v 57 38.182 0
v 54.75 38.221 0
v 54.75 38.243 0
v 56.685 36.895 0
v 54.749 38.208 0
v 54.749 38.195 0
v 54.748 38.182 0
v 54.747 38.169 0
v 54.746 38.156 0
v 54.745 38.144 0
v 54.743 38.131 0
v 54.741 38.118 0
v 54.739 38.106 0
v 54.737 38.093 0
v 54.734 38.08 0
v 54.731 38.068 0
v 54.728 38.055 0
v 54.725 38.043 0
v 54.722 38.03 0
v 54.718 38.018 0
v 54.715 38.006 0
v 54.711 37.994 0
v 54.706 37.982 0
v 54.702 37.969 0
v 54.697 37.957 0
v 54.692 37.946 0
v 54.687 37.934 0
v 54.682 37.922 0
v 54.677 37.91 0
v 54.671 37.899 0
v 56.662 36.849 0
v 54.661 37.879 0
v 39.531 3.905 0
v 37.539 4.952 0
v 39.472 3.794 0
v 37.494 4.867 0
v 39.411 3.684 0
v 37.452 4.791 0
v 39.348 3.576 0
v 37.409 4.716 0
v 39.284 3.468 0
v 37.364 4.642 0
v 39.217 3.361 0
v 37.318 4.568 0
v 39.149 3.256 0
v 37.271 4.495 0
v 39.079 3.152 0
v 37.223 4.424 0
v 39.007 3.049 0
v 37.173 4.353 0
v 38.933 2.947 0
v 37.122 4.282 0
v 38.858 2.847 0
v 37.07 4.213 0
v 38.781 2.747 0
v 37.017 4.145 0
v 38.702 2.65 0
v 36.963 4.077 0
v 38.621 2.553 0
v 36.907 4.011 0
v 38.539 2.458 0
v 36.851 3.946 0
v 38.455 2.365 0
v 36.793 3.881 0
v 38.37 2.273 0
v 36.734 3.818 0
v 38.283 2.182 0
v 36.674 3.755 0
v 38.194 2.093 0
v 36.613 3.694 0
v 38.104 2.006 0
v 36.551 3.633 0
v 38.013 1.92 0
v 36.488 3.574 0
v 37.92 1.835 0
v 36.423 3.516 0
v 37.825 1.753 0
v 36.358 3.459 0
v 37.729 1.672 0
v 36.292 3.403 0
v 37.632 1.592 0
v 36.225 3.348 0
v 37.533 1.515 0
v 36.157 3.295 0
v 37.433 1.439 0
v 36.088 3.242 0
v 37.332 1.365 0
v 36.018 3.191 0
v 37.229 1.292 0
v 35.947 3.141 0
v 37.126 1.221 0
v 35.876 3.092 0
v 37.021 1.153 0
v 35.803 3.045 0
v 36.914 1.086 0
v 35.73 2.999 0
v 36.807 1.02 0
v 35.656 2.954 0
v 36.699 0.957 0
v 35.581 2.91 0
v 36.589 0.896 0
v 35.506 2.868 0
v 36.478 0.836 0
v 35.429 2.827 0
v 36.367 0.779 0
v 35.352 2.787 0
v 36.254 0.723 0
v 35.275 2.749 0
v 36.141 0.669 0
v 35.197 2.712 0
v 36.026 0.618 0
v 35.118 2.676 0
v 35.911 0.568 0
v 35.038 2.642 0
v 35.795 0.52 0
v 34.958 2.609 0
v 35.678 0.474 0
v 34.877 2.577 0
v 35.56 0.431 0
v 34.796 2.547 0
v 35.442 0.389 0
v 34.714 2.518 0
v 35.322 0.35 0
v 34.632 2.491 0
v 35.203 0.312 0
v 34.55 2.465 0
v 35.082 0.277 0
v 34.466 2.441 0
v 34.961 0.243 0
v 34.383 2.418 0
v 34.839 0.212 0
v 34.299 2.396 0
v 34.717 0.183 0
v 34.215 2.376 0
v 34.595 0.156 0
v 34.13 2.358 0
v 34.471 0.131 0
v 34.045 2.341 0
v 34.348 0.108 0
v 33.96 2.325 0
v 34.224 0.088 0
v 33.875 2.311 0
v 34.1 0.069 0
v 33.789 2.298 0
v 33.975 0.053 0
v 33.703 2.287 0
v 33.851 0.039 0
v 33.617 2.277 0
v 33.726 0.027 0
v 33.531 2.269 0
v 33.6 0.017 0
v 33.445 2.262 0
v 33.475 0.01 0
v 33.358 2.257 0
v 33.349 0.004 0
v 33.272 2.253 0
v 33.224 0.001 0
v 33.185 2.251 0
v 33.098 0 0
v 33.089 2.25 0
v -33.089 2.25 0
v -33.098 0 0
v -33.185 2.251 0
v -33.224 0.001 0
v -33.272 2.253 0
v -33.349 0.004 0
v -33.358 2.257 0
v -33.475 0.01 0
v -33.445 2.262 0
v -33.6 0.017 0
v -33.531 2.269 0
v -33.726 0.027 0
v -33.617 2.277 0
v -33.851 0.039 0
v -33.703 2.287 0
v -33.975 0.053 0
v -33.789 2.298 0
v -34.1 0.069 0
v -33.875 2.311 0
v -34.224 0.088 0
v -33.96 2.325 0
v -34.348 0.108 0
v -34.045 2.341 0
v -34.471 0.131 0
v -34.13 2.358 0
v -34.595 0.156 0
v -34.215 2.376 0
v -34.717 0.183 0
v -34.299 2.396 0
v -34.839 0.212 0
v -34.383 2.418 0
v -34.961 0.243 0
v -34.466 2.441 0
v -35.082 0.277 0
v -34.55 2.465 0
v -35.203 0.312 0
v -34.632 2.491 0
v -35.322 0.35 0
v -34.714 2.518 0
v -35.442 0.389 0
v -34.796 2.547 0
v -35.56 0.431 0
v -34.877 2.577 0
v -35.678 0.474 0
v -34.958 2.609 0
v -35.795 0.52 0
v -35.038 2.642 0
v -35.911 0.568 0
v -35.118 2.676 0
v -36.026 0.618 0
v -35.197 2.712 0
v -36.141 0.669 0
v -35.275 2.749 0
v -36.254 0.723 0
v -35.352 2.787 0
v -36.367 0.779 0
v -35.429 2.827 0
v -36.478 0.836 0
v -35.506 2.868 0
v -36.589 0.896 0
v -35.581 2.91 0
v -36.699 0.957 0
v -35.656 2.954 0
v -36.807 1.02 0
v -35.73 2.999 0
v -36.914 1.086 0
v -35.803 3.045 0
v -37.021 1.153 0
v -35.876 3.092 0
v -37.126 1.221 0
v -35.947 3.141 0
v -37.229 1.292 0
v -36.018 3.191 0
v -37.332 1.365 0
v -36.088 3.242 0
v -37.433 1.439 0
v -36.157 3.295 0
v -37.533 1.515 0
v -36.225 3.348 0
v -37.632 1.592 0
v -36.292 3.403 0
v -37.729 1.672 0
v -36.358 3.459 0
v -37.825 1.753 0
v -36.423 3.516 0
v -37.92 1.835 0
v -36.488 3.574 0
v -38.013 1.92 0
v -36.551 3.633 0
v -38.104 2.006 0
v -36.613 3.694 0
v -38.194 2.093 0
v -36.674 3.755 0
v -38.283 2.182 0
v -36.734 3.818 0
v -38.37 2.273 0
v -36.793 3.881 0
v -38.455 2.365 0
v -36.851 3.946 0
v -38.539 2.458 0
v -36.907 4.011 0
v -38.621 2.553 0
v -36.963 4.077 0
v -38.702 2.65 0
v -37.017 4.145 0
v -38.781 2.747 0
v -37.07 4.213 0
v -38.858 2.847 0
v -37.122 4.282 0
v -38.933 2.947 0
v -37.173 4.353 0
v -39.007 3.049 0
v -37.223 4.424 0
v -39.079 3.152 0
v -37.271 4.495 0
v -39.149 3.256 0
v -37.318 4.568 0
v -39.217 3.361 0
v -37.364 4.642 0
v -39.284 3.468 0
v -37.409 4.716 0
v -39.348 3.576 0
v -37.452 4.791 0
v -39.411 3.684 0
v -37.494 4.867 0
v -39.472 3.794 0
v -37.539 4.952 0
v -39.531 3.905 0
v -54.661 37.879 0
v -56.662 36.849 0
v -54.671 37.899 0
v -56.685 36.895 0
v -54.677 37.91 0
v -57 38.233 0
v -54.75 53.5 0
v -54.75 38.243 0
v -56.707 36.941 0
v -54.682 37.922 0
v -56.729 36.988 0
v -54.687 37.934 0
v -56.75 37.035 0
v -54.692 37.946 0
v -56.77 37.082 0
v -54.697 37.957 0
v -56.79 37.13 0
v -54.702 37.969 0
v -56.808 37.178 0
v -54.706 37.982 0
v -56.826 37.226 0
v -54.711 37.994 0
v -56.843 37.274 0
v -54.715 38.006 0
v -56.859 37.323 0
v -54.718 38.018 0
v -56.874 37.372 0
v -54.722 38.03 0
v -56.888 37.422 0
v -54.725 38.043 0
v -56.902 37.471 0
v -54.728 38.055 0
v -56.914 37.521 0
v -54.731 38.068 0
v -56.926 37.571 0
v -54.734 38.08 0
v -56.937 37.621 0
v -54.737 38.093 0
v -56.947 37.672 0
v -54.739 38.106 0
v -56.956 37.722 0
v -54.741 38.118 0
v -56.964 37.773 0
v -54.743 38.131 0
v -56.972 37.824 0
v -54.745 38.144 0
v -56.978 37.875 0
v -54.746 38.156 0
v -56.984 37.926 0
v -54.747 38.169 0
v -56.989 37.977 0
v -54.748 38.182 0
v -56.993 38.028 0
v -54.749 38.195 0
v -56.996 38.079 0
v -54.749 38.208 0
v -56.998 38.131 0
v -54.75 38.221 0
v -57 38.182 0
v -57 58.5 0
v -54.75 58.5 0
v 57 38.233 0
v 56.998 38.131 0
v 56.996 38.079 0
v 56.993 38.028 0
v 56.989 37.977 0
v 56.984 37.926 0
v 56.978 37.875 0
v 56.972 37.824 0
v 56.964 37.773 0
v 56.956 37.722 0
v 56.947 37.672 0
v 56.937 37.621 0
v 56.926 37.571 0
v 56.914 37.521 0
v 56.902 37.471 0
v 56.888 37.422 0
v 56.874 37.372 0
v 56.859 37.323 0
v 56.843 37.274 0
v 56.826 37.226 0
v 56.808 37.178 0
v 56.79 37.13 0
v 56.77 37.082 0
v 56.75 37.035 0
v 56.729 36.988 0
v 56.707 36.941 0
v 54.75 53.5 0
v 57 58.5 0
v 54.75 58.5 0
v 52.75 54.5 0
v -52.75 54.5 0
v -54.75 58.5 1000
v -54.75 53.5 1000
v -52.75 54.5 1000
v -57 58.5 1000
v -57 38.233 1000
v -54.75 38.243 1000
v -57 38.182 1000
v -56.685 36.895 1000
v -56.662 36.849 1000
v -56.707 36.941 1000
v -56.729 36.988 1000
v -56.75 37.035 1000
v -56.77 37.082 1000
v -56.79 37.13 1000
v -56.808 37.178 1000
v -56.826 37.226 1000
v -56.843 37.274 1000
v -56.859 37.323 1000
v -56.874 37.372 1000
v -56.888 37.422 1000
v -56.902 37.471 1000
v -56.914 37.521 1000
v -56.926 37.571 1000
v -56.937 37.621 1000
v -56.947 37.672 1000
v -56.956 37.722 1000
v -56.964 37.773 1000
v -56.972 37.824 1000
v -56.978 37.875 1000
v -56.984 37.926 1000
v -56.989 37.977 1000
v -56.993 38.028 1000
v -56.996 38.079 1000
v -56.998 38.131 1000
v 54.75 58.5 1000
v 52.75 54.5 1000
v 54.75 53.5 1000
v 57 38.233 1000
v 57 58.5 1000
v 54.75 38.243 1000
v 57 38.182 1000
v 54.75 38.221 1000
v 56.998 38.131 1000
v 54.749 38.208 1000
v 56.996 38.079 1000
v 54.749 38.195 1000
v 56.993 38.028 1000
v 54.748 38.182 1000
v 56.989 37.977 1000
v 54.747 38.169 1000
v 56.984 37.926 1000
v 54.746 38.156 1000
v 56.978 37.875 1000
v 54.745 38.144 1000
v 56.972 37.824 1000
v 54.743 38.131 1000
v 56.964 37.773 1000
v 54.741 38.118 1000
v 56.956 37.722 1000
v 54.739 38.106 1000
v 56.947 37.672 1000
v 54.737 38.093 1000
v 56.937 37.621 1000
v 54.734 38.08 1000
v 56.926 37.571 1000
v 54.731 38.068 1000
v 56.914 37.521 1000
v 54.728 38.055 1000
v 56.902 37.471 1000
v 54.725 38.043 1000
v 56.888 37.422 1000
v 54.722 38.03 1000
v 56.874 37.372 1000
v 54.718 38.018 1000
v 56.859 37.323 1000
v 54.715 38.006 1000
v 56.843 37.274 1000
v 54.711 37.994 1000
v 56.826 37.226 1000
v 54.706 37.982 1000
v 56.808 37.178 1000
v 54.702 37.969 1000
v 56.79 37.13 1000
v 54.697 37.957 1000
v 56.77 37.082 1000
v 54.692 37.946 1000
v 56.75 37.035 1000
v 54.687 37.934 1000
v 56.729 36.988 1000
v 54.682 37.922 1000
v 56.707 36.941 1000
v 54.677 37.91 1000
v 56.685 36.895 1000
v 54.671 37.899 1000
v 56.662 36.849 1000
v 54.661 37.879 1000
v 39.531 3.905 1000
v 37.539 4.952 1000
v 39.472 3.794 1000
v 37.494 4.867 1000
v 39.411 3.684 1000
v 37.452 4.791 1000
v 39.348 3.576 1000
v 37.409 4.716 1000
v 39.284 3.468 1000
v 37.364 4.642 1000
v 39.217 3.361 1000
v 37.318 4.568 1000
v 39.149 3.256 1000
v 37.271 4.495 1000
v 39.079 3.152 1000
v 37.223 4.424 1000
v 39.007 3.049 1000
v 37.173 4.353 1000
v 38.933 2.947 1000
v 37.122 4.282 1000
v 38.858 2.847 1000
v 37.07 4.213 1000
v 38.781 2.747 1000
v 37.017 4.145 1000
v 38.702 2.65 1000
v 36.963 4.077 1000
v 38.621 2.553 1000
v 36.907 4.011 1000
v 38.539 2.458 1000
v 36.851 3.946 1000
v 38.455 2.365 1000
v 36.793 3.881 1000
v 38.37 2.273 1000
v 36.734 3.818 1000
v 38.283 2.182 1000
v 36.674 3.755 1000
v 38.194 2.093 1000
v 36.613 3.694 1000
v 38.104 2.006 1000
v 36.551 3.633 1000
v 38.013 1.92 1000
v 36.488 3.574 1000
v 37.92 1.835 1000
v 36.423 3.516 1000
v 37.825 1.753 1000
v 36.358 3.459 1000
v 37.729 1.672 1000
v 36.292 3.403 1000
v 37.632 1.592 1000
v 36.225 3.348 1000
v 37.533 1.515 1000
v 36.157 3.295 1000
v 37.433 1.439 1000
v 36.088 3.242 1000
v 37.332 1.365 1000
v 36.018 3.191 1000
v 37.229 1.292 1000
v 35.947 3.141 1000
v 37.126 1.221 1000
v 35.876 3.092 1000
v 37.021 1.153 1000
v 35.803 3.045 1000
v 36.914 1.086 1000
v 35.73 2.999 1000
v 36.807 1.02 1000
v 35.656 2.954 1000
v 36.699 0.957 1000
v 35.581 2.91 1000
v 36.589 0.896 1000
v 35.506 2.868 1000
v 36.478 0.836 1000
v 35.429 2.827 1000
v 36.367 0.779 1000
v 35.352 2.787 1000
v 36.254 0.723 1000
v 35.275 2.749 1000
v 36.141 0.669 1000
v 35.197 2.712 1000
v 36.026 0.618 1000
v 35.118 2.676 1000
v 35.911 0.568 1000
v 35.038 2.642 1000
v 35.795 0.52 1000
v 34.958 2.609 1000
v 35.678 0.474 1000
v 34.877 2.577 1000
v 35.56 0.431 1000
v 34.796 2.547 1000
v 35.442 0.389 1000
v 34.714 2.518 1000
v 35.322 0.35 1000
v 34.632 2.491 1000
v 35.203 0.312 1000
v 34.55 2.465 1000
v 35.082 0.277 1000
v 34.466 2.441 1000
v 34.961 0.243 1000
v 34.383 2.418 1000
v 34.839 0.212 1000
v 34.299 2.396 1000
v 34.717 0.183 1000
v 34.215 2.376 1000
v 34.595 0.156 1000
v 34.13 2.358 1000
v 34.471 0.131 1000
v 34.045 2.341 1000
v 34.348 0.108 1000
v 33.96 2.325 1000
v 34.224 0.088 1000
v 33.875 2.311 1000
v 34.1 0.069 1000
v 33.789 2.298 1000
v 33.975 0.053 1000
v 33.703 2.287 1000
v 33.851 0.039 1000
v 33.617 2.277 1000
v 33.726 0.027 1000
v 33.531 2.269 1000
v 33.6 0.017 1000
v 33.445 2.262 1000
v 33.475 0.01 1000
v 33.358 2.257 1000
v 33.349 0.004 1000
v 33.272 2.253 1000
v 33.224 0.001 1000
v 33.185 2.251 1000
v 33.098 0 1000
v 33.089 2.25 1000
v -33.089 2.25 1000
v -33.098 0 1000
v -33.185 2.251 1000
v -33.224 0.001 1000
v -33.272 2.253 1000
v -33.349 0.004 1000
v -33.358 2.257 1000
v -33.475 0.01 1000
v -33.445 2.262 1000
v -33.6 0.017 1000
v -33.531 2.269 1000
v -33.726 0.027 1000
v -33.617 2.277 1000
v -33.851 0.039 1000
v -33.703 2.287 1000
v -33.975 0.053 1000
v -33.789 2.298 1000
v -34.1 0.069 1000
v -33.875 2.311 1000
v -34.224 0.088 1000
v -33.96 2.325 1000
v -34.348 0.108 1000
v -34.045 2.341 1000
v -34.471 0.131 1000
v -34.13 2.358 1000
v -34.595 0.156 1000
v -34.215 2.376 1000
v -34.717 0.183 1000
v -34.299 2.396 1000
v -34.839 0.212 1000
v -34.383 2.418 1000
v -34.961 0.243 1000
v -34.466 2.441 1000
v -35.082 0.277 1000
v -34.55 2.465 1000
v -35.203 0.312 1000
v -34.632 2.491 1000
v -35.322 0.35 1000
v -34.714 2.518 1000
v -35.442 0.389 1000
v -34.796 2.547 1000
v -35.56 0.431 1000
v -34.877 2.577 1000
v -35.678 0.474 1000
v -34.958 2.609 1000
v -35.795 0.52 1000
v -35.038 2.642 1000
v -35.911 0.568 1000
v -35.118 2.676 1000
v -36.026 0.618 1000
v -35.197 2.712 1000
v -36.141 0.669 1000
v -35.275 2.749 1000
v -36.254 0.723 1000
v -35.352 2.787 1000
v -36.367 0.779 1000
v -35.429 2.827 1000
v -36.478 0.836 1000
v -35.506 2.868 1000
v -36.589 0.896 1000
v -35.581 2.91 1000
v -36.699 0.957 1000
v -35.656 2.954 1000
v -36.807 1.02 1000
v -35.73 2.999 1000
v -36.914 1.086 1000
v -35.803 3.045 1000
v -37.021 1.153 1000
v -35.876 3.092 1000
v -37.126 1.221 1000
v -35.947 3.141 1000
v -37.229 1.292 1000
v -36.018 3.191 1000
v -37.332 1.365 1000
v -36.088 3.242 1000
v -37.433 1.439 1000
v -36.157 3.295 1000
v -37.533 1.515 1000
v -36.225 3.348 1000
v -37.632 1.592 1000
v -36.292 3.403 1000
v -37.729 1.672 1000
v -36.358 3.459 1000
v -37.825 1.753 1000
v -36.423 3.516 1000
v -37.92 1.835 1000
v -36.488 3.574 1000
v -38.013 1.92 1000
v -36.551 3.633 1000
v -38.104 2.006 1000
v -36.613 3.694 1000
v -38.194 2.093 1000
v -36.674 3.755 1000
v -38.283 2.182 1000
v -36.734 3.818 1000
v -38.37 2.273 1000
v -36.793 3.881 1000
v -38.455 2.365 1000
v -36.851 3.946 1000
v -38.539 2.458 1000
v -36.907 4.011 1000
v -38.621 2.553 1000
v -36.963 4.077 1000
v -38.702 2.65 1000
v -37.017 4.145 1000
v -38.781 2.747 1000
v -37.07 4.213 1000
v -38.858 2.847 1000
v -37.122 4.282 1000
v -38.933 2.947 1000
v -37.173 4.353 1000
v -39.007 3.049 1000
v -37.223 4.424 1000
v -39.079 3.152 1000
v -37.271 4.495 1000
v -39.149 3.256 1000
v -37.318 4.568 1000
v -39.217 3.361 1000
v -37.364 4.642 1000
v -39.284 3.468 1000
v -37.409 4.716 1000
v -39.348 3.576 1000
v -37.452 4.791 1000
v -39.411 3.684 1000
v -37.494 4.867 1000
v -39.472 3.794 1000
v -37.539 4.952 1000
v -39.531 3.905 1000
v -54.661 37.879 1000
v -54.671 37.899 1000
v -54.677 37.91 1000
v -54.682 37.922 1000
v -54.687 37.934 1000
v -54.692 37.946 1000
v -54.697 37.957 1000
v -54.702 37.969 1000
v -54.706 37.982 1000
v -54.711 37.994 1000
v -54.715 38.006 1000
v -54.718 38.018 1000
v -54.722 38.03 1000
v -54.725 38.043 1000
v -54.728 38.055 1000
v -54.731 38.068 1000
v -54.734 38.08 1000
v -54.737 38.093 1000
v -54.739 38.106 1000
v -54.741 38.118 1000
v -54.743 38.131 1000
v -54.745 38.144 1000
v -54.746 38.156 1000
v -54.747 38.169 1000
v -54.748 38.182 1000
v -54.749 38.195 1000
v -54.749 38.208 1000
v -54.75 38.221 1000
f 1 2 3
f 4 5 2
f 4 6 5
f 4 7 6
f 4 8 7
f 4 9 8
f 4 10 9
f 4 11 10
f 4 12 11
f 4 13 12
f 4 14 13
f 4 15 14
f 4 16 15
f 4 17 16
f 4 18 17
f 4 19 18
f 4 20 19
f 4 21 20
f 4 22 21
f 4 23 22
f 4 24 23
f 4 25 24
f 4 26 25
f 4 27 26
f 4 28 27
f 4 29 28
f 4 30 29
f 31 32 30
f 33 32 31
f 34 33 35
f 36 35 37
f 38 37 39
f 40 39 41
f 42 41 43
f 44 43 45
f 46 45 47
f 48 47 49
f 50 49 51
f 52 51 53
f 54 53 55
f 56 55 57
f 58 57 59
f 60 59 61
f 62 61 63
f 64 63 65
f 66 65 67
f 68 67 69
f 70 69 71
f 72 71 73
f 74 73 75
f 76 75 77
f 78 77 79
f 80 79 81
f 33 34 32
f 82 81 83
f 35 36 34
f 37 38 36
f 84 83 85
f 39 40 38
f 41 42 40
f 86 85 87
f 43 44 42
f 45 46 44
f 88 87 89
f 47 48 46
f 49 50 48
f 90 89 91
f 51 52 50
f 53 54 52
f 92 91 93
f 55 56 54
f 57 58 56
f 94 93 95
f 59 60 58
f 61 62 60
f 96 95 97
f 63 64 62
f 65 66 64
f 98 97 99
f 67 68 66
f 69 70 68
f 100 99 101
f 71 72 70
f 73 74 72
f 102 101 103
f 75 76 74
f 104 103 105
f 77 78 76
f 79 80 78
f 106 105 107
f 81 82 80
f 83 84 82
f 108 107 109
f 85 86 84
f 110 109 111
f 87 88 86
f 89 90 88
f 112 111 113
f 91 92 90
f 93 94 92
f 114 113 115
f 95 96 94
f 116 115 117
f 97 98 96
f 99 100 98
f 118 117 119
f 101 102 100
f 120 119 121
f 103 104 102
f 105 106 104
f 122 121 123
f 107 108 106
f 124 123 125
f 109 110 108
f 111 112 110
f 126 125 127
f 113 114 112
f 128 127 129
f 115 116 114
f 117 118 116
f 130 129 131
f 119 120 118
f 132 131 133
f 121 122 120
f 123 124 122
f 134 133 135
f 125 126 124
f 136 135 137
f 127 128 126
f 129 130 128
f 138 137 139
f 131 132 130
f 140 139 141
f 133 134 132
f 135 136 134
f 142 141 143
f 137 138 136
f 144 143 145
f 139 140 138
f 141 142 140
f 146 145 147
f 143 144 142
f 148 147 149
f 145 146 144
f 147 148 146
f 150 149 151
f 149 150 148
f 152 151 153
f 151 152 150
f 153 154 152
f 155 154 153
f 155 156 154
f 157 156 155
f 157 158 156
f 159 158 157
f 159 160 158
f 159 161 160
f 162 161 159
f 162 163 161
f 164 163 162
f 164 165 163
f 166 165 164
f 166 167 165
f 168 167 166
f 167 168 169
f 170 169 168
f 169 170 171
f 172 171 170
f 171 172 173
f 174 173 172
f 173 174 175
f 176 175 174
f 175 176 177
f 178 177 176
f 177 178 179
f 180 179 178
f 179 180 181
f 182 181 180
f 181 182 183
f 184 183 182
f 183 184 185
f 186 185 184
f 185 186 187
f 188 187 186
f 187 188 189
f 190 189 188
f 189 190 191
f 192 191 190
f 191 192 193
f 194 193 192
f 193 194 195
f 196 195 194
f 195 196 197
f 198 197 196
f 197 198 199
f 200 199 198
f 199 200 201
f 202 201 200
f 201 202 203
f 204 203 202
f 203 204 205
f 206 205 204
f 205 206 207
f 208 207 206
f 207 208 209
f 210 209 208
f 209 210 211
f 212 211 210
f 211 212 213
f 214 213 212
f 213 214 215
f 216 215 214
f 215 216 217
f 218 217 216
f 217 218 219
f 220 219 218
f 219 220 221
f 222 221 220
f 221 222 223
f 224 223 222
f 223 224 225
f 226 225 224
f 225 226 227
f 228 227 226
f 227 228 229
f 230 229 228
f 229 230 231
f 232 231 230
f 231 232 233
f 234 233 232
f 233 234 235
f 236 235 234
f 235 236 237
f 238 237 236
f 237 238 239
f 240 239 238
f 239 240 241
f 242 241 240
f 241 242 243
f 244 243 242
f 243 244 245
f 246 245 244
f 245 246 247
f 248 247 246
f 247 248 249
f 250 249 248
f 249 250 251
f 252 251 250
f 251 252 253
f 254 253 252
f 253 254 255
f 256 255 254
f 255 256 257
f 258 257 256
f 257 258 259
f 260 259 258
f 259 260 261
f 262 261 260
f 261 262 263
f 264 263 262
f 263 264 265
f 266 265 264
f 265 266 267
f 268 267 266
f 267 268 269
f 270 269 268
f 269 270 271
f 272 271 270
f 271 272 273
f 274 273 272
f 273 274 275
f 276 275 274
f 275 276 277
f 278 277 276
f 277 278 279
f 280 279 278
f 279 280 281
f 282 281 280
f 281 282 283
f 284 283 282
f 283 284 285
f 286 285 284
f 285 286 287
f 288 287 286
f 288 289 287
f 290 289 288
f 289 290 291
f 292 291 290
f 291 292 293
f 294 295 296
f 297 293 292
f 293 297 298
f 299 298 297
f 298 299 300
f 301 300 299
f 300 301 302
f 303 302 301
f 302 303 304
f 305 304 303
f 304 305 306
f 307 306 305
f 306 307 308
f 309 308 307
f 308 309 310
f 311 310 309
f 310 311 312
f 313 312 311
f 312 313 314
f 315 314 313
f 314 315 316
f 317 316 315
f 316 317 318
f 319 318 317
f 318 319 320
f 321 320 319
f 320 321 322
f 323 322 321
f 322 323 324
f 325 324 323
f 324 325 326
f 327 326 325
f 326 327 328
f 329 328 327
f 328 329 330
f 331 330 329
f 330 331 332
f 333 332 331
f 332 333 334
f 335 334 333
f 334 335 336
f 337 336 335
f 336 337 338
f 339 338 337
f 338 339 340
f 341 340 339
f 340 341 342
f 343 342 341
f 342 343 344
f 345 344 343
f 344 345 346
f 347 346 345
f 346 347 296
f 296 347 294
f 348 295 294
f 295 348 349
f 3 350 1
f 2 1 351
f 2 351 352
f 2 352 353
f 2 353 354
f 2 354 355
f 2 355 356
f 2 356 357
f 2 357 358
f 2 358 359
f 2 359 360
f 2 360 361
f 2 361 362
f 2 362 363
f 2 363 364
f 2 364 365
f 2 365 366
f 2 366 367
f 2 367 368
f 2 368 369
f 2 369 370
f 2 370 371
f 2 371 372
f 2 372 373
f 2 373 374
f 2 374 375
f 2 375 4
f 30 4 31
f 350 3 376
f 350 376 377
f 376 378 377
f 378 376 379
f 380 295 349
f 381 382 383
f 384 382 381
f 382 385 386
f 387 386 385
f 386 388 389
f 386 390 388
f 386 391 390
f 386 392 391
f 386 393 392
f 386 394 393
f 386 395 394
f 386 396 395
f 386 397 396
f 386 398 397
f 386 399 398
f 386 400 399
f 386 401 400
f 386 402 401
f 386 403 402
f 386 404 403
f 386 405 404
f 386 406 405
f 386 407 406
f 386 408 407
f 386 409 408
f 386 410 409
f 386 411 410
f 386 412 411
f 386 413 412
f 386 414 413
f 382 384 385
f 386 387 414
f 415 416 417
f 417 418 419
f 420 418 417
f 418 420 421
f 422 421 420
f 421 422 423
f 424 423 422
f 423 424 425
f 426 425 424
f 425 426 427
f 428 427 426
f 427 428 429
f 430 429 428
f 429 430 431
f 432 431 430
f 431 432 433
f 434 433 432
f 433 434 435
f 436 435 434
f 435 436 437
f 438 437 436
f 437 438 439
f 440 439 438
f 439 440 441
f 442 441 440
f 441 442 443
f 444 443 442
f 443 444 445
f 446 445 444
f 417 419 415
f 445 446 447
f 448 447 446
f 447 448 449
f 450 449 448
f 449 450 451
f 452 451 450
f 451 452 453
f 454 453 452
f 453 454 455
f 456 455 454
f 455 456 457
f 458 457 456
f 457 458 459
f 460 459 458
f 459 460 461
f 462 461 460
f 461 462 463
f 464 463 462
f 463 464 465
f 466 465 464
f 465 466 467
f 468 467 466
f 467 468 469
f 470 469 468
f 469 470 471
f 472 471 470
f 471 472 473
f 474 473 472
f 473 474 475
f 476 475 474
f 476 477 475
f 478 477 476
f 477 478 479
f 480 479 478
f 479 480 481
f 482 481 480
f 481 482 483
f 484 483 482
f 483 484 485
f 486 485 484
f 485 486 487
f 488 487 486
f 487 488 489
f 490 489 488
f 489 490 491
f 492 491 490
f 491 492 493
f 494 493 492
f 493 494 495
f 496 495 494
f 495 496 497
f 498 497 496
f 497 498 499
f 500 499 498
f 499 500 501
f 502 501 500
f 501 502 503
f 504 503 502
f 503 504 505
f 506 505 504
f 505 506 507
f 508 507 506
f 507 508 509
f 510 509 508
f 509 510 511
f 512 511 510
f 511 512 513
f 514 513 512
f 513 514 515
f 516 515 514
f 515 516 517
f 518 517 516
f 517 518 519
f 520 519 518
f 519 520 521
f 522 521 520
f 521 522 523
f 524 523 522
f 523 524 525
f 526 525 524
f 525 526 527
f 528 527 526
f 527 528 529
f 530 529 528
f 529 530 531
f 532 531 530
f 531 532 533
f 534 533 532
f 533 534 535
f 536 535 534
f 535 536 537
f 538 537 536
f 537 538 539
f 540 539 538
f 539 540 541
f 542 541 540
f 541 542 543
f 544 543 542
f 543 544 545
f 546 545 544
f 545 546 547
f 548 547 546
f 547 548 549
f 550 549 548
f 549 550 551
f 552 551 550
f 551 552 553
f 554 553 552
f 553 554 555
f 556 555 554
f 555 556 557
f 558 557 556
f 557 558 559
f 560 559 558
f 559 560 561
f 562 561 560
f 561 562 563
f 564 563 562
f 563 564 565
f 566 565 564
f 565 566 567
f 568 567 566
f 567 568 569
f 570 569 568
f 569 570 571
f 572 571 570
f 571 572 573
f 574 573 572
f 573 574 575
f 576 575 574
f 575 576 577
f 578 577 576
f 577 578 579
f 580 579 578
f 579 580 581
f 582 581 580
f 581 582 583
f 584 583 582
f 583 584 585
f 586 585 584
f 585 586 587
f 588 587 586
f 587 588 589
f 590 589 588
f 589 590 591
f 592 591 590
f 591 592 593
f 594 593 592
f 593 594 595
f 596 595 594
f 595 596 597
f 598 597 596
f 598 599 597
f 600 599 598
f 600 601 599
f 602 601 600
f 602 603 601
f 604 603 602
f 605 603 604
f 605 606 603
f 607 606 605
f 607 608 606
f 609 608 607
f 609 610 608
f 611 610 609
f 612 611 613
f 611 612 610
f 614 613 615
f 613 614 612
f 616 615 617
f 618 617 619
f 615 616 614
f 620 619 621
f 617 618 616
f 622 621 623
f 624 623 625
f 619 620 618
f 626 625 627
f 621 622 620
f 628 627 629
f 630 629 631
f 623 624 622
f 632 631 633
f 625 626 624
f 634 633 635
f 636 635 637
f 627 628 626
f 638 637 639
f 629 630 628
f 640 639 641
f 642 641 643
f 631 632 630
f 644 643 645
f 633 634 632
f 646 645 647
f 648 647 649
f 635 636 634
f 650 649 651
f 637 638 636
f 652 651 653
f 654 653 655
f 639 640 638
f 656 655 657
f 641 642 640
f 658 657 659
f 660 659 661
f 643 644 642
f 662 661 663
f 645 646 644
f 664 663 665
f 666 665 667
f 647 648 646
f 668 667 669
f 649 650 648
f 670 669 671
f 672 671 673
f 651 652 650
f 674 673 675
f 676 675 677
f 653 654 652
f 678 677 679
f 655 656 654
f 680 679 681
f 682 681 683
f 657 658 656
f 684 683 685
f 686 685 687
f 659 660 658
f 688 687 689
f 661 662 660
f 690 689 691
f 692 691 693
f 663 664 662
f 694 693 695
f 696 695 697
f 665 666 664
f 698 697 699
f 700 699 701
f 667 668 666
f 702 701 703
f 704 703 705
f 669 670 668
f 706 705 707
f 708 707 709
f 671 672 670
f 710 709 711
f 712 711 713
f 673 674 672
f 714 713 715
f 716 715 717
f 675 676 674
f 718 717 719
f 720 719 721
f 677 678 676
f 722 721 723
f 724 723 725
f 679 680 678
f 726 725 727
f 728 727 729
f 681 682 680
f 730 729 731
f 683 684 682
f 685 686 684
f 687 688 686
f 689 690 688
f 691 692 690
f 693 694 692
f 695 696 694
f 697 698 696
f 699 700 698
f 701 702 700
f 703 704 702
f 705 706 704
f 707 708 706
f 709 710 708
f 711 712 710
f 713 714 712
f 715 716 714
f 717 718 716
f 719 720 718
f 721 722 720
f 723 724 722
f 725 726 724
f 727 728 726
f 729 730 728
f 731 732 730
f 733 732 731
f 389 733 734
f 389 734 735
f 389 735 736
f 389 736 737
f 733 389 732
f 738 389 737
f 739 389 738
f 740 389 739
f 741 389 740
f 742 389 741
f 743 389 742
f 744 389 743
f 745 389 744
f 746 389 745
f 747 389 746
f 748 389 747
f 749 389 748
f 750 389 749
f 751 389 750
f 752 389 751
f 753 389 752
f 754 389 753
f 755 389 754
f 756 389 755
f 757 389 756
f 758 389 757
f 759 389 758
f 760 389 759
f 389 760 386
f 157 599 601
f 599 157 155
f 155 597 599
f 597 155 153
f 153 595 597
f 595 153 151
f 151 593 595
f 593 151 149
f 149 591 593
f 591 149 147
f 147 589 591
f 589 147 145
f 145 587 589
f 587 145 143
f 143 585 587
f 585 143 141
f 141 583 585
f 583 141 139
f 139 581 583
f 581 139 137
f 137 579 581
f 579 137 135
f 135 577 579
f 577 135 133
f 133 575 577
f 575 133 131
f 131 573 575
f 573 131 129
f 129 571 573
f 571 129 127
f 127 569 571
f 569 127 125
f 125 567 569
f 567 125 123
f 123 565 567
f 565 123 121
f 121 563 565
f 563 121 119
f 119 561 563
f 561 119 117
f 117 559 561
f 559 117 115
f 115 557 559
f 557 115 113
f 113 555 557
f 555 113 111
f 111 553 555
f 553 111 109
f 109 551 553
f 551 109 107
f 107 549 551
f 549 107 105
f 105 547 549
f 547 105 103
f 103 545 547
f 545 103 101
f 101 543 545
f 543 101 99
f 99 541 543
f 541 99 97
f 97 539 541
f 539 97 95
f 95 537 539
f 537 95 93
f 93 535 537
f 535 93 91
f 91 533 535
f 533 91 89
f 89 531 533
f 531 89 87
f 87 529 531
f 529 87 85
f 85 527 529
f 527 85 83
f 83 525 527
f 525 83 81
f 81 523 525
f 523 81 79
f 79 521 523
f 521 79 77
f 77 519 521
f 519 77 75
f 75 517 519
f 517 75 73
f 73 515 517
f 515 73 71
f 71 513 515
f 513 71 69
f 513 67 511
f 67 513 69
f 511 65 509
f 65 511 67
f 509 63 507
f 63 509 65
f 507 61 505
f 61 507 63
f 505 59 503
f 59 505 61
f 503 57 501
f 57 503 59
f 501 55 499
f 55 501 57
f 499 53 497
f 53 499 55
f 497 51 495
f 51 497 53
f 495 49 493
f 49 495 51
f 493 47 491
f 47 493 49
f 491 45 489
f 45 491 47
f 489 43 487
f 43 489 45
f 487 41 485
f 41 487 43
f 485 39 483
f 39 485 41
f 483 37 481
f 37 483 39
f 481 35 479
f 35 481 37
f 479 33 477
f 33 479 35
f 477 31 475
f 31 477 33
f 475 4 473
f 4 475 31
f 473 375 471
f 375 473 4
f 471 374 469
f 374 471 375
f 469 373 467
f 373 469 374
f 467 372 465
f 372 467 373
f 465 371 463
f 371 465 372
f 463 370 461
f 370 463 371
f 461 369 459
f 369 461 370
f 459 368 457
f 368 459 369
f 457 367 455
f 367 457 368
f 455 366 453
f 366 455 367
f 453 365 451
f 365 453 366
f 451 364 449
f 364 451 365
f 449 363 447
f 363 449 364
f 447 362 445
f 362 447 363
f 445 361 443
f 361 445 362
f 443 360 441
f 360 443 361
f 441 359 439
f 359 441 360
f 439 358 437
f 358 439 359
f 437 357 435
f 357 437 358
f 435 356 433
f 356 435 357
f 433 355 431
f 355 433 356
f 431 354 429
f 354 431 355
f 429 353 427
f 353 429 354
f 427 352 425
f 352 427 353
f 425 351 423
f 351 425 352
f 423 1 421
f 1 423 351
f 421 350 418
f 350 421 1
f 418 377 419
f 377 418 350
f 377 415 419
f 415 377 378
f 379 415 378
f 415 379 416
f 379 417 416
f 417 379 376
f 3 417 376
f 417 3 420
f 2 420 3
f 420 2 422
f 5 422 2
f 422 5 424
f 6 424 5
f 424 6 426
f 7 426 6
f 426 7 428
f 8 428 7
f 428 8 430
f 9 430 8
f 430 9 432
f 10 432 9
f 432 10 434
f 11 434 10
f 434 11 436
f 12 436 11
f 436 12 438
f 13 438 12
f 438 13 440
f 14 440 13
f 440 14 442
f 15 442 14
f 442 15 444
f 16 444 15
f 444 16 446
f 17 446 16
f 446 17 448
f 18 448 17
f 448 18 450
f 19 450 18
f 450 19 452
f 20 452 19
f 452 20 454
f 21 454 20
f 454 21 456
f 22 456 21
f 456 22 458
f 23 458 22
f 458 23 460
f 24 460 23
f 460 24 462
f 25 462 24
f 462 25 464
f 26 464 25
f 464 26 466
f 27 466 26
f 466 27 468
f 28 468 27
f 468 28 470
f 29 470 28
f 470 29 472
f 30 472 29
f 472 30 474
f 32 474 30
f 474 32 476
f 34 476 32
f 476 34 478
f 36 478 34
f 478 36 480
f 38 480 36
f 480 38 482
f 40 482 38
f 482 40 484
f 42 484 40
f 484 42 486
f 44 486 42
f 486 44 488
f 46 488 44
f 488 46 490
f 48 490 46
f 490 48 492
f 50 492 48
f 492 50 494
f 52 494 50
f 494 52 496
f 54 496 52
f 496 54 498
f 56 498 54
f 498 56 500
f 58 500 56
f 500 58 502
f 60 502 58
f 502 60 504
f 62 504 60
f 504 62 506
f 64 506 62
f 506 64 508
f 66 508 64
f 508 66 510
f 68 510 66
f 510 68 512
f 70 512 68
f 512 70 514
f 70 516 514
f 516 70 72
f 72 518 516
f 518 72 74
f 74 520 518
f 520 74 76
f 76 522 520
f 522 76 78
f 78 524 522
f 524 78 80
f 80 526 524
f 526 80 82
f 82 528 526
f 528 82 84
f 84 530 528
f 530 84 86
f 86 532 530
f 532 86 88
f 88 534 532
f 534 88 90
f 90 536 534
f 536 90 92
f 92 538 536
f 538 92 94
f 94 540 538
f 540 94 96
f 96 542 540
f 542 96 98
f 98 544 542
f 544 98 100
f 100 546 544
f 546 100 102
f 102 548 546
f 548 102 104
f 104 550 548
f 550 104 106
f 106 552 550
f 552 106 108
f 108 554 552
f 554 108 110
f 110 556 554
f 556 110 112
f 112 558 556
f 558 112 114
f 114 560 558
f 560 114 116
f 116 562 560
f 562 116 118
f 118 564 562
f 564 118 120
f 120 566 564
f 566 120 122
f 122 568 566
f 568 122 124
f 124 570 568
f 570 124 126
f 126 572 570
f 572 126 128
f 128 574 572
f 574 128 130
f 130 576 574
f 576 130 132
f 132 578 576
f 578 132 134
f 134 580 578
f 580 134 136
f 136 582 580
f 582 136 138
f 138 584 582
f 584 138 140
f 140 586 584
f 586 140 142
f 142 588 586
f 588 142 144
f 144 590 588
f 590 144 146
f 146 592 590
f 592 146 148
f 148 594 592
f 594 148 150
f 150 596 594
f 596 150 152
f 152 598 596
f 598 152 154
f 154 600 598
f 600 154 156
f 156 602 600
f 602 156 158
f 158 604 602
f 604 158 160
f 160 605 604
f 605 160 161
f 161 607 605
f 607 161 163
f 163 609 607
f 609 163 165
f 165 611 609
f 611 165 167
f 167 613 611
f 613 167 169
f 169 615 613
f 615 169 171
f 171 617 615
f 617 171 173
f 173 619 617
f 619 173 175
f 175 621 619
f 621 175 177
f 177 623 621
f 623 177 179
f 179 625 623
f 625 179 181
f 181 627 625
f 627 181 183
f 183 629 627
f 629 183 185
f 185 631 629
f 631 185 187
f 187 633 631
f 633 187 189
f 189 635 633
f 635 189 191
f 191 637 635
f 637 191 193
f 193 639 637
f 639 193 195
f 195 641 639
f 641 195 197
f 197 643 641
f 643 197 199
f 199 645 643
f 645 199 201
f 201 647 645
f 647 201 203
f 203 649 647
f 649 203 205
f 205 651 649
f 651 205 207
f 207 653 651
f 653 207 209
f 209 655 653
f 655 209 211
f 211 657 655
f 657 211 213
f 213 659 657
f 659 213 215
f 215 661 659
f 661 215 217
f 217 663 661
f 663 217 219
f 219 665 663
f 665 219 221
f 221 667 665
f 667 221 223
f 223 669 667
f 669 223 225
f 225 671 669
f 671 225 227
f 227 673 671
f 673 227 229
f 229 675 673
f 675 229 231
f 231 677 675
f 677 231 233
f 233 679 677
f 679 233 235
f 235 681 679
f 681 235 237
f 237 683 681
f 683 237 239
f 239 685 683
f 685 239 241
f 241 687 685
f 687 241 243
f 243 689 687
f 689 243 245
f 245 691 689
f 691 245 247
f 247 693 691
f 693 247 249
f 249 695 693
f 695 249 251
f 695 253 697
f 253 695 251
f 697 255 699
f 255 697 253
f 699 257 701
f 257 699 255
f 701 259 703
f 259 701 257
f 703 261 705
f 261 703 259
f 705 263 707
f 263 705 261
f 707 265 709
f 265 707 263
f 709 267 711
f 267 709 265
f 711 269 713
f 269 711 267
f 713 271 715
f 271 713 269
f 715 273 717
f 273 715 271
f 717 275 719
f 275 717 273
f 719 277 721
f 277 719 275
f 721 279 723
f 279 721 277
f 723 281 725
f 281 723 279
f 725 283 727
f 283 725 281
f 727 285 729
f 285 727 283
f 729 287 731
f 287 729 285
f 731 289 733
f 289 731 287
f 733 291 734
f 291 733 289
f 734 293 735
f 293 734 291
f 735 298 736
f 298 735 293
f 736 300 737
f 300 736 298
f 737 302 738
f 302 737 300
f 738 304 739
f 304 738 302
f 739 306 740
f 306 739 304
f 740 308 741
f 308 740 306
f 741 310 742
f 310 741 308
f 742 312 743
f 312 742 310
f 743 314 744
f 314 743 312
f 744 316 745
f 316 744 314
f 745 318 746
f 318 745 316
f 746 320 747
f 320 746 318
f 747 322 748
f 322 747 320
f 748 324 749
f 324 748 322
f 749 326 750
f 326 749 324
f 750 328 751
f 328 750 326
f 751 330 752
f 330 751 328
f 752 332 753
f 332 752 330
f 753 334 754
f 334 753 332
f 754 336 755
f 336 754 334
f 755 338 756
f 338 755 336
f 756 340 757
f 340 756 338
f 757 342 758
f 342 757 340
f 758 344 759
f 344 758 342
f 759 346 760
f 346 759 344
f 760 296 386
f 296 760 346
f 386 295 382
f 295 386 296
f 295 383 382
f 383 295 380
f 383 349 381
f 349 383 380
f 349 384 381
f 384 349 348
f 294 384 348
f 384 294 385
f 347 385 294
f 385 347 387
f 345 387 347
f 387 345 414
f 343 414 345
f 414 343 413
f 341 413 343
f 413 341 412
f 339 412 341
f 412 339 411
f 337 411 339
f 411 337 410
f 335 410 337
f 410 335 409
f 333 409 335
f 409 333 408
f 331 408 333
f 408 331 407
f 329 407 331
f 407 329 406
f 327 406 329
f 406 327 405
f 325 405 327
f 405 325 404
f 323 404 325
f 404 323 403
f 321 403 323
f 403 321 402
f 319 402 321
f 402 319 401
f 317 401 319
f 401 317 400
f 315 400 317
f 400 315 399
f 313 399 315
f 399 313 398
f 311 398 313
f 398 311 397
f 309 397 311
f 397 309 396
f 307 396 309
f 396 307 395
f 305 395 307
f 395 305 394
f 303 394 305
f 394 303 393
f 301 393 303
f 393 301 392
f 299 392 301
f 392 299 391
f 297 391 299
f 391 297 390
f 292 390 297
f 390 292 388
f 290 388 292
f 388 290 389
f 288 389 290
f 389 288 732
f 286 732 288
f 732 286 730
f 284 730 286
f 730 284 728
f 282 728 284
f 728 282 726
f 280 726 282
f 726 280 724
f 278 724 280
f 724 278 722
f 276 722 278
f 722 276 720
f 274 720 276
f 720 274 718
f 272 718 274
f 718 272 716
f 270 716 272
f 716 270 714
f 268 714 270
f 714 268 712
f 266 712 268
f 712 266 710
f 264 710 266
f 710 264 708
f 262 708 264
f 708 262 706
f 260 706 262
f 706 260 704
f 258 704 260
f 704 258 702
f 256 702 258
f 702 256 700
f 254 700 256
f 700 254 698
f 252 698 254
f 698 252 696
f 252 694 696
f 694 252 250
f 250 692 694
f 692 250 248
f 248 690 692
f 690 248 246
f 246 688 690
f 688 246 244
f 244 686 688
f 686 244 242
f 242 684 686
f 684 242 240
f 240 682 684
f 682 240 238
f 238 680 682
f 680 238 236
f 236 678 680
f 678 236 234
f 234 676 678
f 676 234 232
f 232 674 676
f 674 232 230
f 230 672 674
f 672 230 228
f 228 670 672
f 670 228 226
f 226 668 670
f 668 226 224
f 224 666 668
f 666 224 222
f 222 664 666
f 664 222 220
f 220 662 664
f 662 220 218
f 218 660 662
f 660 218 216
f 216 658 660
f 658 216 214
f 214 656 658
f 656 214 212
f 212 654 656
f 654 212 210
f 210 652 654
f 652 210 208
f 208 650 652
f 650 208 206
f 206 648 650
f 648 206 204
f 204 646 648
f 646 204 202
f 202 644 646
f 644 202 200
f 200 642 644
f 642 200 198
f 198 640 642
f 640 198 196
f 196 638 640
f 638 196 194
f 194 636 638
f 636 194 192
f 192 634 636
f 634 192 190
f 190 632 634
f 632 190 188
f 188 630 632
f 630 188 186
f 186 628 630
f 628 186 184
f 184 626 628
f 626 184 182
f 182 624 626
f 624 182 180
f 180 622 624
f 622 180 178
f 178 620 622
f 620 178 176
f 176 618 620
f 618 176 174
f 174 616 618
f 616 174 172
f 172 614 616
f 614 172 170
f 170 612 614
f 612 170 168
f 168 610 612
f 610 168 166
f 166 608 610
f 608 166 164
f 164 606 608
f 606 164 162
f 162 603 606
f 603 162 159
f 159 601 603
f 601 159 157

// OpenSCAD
$fn = 50;

difference() {
	union() {
		linear_extrude(height = 1000.0) {
			polygon(points = [[56.9995601, 38.1820114], [56.9982404, 38.1306519], [56.9960415, 38.0793225], [56.9929638, 38.0280383], [56.9890084, 37.9768144], [56.9841763, 37.9256657], [56.978469, 37.8746072], [56.9718882, 37.823654], [56.9644358, 37.7728209], [56.956114, 37.7221229], [56.9469252, 37.6715749], [56.9368722, 37.6211916], [56.9259578, 37.5709879], [56.9141852, 37.5209784], [56.901558, 37.4711779], [56.8880798, 37.4216009], [56.8737546, 37.372262], [56.8585866, 37.3231757], [56.8425802, 37.2743563], [56.8257401, 37.2258182], [56.8080713, 37.1775755], [56.7895789, 37.1296426], [56.7702684, 37.0820333], [56.7501454, 37.0347617], [56.7292159, 36.9878416], [56.7074859, 36.9412868], [56.6849619, 36.895111], [56.6616504, 36.8493277], [39.5307002, 3.9051927], [39.4717998, 3.7942803], [39.4109872, 3.6844047], [39.3482805, 3.575599], [39.2836987, 3.4678957], [39.2172609, 3.3613272], [39.1489873, 3.2559255], [39.0788983, 3.1517221], [39.0070149, 3.0487484], [38.9333586, 2.9470352], [38.8579516, 2.8466131], [38.7808165, 2.7475122], [38.7019765, 2.6497622], [38.6214552, 2.5533924], [38.5392767, 2.4584319], [38.4554658, 2.3649089], [38.3700475, 2.2728517], [38.2830475, 2.1822879], [38.1944919, 2.0932445], [38.1044072, 2.0057484], [38.0128206, 1.9198257], [37.9197594, 1.8355024], [37.8252517, 1.7528035], [37.7293256, 1.6717541], [37.6320102, 1.5923783], [37.5333344, 1.5147001], [37.433328, 1.4387427], [37.3320209, 1.3645289], [37.2294436, 1.2920809], [37.1256268, 1.2214206], [37.0206017, 1.152569], [36.9143997, 1.085547], [36.8070528, 1.0203745], [36.6985931, 0.9570711], [36.5890533, 0.8956559], [36.478466, 0.8361472], [36.3668647, 0.778563], [36.2542826, 0.7229204], [36.1407537, 0.6692362], [36.0263119, 0.6175265], [35.9109917, 0.5678068], [35.7948275, 0.520092], [35.6778543, 0.4743964], [35.5601072, 0.4307338], [35.4416214, 0.3891172], [35.3224326, 0.3495592], [35.2025764, 0.3120716], [35.082089, 0.2766656], [34.9610063, 0.2433519], [34.8393648, 0.2121405], [34.7172009, 0.1830407], [34.5945513, 0.1560613], [34.4714528, 0.1312103], [34.3479423, 0.1084953], [34.2240569, 0.0879229], [34.0998338, 0.0694995], [33.9753101, 0.0532305], [33.8505234, 0.0391209], [33.725511, 0.0271747], [33.6003104, 0.0173958], [33.4749592, 0.0097868], [33.3494951, 0.0043502], [33.2239556, 0.0010876], [33.0983784, -0.0], [-33.0983784, -0.0], [-33.2239556, 0.0010876], [-33.3494951, 0.0043502], [-33.4749592, 0.0097868], [-33.6003104, 0.0173958], [-33.725511, 0.0271747], [-33.8505234, 0.0391209], [-33.9753101, 0.0532305], [-34.0998338, 0.0694995], [-34.2240569, 0.0879229], [-34.3479423, 0.1084953], [-34.4714528, 0.1312103], [-34.5945513, 0.1560613], [-34.7172009, 0.1830407], [-34.8393648, 0.2121405], [-34.9610063, 0.2433519], [-35.082089, 0.2766656], [-35.2025764, 0.3120716], [-35.3224326, 0.3495592], [-35.4416214, 0.3891172], [-35.5601072, 0.4307338], [-35.6778543, 0.4743964], [-35.7948275, 0.520092], [-35.9109917, 0.5678068], [-36.0263119, 0.6175265], [-36.1407537, 0.6692362], [-36.2542826, 0.7229204], [-36.3668647, 0.778563], [-36.478466, 0.8361472], [-36.5890533, 0.8956559], [-36.6985931, 0.9570711], [-36.8070528, 1.0203745], [-36.9143997, 1.085547], [-37.0206017, 1.152569], [-37.1256268, 1.2214206], [-37.2294436, 1.2920809], [-37.3320209, 1.3645289], [-37.433328, 1.4387427], [-37.5333344, 1.5147001], [-37.6320102, 1.5923783], [-37.7293256, 1.6717541], [-37.8252517, 1.7528035], [-37.9197594, 1.8355024], [-38.0128206, 1.9198257], [-38.1044072, 2.0057484], [-38.1944919, 2.0932445], [-38.2830475, 2.1822879], [-38.3700475, 2.2728517], [-38.4554658, 2.3649089], [-38.5392767, 2.4584319], [-38.6214552, 2.5533924], [-38.7019765, 2.6497622], [-38.7808165, 2.7475122], [-38.8579516, 2.8466131], [-38.9333586, 2.9470352], [-39.0070149, 3.0487484], [-39.0788983, 3.1517221], [-39.1489873, 3.2559255], [-39.2172609, 3.3613272], [-39.2836987, 3.4678957], [-39.3482805, 3.575599], [-39.4109872, 3.6844047], [-39.4717998, 3.7942803], [-39.5307002, 3.9051927], [-56.6616504, 36.8493277], [-56.6849619, 36.895111], [-56.7074859, 36.9412868], [-56.7292159, 36.9878416], [-56.7501454, 37.0347617], [-56.7702684, 37.0820333], [-56.7895789, 37.1296426], [-56.8080713, 37.1775755], [-56.8257401, 37.2258182], [-56.8425802, 37.2743563], [-56.8585866, 37.3231757], [-56.8737546, 37.372262], [-56.8880798, 37.4216009], [-56.901558, 37.4711779], [-56.9141852, 37.5209784], [-56.9259578, 37.5709879], [-56.9368722, 37.6211916], [-56.9469252, 37.6715749], [-56.956114, 37.7221229], [-56.9644358, 37.7728209], [-56.9718882, 37.823654], [-56.978469, 37.8746072], [-56.9841763, 37.9256657], [-56.9890084, 37.9768144], [-56.9929638, 38.0280383], [-56.9960415, 38.0793225], [-56.9982404, 38.1306519], [-56.9995601, 38.1820114], [-57.0, 38.2333859], [-57.0, 58.5], [-54.75, 58.5], [-52.75, 54.5], [-54.75, 53.5], [-54.75, 38.2430192], [-54.7498075, 38.2205437], [-54.7494777, 38.2077052], [-54.748928, 38.1948743], [-54.7481587, 38.1820547], [-54.7471699, 38.1692501], [-54.745962, 38.1564643], [-54.7445354, 38.1437011], [-54.7428903, 38.1309642], [-54.7410275, 38.1182573], [-54.7389472, 38.1055842], [-54.7366503, 38.0929486], [-54.7341373, 38.0803542], [-54.731409, 38.0678046], [-54.7284662, 38.0553036], [-54.7253097, 38.0428549], [-54.7219405, 38.030462], [-54.7183596, 38.0181286], [-54.714568, 38.0058584], [-54.7105669, 37.9936549], [-54.7063573, 37.9815217], [-54.7019406, 37.9694623], [-54.697318, 37.9574804], [-54.6924909, 37.9455794], [-54.6874607, 37.9337628], [-54.6822289, 37.9220341], [-54.676797, 37.9103967], [-54.6711666, 37.898854], [-54.6609683, 37.8788246], [-37.5389576, 4.951881], [-37.4937673, 4.8667852], [-37.4518282, 4.7910103], [-37.408583, 4.7159731], [-37.3640445, 4.6416962], [-37.3182262, 4.568202], [-37.2711417, 4.4955123], [-37.2228052, 4.4236492], [-37.1732313, 4.352634], [-37.1224347, 4.2824882], [-37.0704308, 4.2132327], [-37.0172351, 4.1448884], [-36.9628636, 4.0774757], [-36.9073326, 4.011015], [-36.8506587, 3.945526], [-36.792859, 3.8810285], [-36.7339509, 3.8175419], [-36.6739519, 3.7550851], [-36.6128801, 3.6936769], [-36.5507538, 3.6333358], [-36.4875917, 3.5740798], [-36.4234126, 3.5159267], [-36.358236, 3.458894], [-36.2920812, 3.4029988], [-36.2249682, 3.3482578], [-36.1569171, 3.2946875], [-36.0879483, 3.242304], [-36.0180826, 3.1911229], [-35.9473408, 3.1411596], [-35.8757442, 3.0924292], [-35.8033143, 3.0449462], [-35.7300728, 2.9987248], [-35.6560417, 2.9537791], [-35.5812432, 2.9101223], [-35.5056997, 2.8677677], [-35.429434, 2.8267279], [-35.3524688, 2.7870153], [-35.2748273, 2.7486418], [-35.1965328, 2.7116188], [-35.1176088, 2.6759575], [-35.0380789, 2.6416687], [-34.9579671, 2.6087625], [-34.8772973, 2.5772488], [-34.7960937, 2.5471372], [-34.7143808, 2.5184366], [-34.632183, 2.4911556], [-34.549525, 2.4653026], [-34.4664316, 2.4408851], [-34.3829277, 2.4179105], [-34.2990384, 2.3963857], [-34.2147889, 2.3763172], [-34.1302044, 2.357711], [-34.0453103, 2.3405727], [-33.9601321, 2.3249074], [-33.8746953, 2.3107199], [-33.7890256, 2.2980143], [-33.7031487, 2.2867945], [-33.6170903, 2.2770638], [-33.5308763, 2.2688253], [-33.4445326, 2.2620813], [-33.3580849, 2.2568338], [-33.2715594, 2.2530845], [-33.1849819, 2.2508345], [-33.0886348, 2.25], [33.0886348, 2.25], [33.1849819, 2.2508345], [33.2715594, 2.2530845], [33.3580849, 2.2568338], [33.4445326, 2.2620813], [33.5308763, 2.2688253], [33.6170903, 2.2770638], [33.7031487, 2.2867945], [33.7890256, 2.2980143], [33.8746953, 2.3107199], [33.9601321, 2.3249074], [34.0453103, 2.3405727], [34.1302044, 2.357711], [34.2147889, 2.3763172], [34.2990384, 2.3963857], [34.3829277, 2.4179105], [34.4664316, 2.4408851], [34.549525, 2.4653026], [34.632183, 2.4911556], [34.7143808, 2.5184366], [34.7960937, 2.5471372], [34.8772973, 2.5772488], [34.9579671, 2.6087625], [35.0380789, 2.6416687], [35.1176088, 2.6759575], [35.1965328, 2.7116188], [35.2748273, 2.7486418], [35.3524688, 2.7870153], [35.429434, 2.8267279], [35.5056997, 2.8677677], [35.5812432, 2.9101223], [35.6560417, 2.9537791], [35.7300728, 2.9987248], [35.8033143, 3.0449462], [35.8757442, 3.0924292], [35.9473408, 3.1411596], [36.0180826, 3.1911229], [36.0879483, 3.242304], [36.1569171, 3.2946875], [36.2249682, 3.3482578], [36.2920812, 3.4029988], [36.358236, 3.458894], [36.4234126, 3.5159267], [36.4875917, 3.5740798], [36.5507538, 3.6333358], [36.6128801, 3.6936769], [36.6739519, 3.7550851], [36.7339509, 3.8175419], [36.792859, 3.8810285], [36.8506587, 3.945526], [36.9073326, 4.011015], [36.9628636, 4.0774757], [37.0172351, 4.1448884], [37.0704308, 4.2132327], [37.1224347, 4.2824882], [37.1732313, 4.352634], [37.2228052, 4.4236492], [37.2711417, 4.4955123], [37.3182262, 4.568202], [37.3640445, 4.6416962], [37.408583, 4.7159731], [37.4518282, 4.7910103], [37.4937673, 4.8667852], [37.5389576, 4.951881], [54.6609683, 37.8788246], [54.6711666, 37.898854], [54.676797, 37.9103967], [54.6822289, 37.9220341], [54.6874607, 37.9337628], [54.6924909, 37.9455794], [54.697318, 37.9574804], [54.7019406, 37.9694623], [54.7063573, 37.9815217], [54.7105669, 37.9936549], [54.714568, 38.0058584], [54.7183596, 38.0181286], [54.7219405, 38.030462], [54.7253097, 38.0428549], [54.7284662, 38.0553036], [54.731409, 38.0678046], [54.7341373, 38.0803542], [54.7366503, 38.0929486], [54.7389472, 38.1055842], [54.7410275, 38.1182573], [54.7428903, 38.1309642], [54.7445354, 38.1437011], [54.745962, 38.1564643], [54.7471699, 38.1692501], [54.7481587, 38.1820547], [54.748928, 38.1948743], [54.7494777, 38.2077052], [54.7498075, 38.2205437], [54.75, 38.2430192], [54.75, 53.5], [52.75, 54.5], [54.75, 58.5], [57.0, 58.5], [57.0, 38.2333859]]);
		}
	}
	union();
}
